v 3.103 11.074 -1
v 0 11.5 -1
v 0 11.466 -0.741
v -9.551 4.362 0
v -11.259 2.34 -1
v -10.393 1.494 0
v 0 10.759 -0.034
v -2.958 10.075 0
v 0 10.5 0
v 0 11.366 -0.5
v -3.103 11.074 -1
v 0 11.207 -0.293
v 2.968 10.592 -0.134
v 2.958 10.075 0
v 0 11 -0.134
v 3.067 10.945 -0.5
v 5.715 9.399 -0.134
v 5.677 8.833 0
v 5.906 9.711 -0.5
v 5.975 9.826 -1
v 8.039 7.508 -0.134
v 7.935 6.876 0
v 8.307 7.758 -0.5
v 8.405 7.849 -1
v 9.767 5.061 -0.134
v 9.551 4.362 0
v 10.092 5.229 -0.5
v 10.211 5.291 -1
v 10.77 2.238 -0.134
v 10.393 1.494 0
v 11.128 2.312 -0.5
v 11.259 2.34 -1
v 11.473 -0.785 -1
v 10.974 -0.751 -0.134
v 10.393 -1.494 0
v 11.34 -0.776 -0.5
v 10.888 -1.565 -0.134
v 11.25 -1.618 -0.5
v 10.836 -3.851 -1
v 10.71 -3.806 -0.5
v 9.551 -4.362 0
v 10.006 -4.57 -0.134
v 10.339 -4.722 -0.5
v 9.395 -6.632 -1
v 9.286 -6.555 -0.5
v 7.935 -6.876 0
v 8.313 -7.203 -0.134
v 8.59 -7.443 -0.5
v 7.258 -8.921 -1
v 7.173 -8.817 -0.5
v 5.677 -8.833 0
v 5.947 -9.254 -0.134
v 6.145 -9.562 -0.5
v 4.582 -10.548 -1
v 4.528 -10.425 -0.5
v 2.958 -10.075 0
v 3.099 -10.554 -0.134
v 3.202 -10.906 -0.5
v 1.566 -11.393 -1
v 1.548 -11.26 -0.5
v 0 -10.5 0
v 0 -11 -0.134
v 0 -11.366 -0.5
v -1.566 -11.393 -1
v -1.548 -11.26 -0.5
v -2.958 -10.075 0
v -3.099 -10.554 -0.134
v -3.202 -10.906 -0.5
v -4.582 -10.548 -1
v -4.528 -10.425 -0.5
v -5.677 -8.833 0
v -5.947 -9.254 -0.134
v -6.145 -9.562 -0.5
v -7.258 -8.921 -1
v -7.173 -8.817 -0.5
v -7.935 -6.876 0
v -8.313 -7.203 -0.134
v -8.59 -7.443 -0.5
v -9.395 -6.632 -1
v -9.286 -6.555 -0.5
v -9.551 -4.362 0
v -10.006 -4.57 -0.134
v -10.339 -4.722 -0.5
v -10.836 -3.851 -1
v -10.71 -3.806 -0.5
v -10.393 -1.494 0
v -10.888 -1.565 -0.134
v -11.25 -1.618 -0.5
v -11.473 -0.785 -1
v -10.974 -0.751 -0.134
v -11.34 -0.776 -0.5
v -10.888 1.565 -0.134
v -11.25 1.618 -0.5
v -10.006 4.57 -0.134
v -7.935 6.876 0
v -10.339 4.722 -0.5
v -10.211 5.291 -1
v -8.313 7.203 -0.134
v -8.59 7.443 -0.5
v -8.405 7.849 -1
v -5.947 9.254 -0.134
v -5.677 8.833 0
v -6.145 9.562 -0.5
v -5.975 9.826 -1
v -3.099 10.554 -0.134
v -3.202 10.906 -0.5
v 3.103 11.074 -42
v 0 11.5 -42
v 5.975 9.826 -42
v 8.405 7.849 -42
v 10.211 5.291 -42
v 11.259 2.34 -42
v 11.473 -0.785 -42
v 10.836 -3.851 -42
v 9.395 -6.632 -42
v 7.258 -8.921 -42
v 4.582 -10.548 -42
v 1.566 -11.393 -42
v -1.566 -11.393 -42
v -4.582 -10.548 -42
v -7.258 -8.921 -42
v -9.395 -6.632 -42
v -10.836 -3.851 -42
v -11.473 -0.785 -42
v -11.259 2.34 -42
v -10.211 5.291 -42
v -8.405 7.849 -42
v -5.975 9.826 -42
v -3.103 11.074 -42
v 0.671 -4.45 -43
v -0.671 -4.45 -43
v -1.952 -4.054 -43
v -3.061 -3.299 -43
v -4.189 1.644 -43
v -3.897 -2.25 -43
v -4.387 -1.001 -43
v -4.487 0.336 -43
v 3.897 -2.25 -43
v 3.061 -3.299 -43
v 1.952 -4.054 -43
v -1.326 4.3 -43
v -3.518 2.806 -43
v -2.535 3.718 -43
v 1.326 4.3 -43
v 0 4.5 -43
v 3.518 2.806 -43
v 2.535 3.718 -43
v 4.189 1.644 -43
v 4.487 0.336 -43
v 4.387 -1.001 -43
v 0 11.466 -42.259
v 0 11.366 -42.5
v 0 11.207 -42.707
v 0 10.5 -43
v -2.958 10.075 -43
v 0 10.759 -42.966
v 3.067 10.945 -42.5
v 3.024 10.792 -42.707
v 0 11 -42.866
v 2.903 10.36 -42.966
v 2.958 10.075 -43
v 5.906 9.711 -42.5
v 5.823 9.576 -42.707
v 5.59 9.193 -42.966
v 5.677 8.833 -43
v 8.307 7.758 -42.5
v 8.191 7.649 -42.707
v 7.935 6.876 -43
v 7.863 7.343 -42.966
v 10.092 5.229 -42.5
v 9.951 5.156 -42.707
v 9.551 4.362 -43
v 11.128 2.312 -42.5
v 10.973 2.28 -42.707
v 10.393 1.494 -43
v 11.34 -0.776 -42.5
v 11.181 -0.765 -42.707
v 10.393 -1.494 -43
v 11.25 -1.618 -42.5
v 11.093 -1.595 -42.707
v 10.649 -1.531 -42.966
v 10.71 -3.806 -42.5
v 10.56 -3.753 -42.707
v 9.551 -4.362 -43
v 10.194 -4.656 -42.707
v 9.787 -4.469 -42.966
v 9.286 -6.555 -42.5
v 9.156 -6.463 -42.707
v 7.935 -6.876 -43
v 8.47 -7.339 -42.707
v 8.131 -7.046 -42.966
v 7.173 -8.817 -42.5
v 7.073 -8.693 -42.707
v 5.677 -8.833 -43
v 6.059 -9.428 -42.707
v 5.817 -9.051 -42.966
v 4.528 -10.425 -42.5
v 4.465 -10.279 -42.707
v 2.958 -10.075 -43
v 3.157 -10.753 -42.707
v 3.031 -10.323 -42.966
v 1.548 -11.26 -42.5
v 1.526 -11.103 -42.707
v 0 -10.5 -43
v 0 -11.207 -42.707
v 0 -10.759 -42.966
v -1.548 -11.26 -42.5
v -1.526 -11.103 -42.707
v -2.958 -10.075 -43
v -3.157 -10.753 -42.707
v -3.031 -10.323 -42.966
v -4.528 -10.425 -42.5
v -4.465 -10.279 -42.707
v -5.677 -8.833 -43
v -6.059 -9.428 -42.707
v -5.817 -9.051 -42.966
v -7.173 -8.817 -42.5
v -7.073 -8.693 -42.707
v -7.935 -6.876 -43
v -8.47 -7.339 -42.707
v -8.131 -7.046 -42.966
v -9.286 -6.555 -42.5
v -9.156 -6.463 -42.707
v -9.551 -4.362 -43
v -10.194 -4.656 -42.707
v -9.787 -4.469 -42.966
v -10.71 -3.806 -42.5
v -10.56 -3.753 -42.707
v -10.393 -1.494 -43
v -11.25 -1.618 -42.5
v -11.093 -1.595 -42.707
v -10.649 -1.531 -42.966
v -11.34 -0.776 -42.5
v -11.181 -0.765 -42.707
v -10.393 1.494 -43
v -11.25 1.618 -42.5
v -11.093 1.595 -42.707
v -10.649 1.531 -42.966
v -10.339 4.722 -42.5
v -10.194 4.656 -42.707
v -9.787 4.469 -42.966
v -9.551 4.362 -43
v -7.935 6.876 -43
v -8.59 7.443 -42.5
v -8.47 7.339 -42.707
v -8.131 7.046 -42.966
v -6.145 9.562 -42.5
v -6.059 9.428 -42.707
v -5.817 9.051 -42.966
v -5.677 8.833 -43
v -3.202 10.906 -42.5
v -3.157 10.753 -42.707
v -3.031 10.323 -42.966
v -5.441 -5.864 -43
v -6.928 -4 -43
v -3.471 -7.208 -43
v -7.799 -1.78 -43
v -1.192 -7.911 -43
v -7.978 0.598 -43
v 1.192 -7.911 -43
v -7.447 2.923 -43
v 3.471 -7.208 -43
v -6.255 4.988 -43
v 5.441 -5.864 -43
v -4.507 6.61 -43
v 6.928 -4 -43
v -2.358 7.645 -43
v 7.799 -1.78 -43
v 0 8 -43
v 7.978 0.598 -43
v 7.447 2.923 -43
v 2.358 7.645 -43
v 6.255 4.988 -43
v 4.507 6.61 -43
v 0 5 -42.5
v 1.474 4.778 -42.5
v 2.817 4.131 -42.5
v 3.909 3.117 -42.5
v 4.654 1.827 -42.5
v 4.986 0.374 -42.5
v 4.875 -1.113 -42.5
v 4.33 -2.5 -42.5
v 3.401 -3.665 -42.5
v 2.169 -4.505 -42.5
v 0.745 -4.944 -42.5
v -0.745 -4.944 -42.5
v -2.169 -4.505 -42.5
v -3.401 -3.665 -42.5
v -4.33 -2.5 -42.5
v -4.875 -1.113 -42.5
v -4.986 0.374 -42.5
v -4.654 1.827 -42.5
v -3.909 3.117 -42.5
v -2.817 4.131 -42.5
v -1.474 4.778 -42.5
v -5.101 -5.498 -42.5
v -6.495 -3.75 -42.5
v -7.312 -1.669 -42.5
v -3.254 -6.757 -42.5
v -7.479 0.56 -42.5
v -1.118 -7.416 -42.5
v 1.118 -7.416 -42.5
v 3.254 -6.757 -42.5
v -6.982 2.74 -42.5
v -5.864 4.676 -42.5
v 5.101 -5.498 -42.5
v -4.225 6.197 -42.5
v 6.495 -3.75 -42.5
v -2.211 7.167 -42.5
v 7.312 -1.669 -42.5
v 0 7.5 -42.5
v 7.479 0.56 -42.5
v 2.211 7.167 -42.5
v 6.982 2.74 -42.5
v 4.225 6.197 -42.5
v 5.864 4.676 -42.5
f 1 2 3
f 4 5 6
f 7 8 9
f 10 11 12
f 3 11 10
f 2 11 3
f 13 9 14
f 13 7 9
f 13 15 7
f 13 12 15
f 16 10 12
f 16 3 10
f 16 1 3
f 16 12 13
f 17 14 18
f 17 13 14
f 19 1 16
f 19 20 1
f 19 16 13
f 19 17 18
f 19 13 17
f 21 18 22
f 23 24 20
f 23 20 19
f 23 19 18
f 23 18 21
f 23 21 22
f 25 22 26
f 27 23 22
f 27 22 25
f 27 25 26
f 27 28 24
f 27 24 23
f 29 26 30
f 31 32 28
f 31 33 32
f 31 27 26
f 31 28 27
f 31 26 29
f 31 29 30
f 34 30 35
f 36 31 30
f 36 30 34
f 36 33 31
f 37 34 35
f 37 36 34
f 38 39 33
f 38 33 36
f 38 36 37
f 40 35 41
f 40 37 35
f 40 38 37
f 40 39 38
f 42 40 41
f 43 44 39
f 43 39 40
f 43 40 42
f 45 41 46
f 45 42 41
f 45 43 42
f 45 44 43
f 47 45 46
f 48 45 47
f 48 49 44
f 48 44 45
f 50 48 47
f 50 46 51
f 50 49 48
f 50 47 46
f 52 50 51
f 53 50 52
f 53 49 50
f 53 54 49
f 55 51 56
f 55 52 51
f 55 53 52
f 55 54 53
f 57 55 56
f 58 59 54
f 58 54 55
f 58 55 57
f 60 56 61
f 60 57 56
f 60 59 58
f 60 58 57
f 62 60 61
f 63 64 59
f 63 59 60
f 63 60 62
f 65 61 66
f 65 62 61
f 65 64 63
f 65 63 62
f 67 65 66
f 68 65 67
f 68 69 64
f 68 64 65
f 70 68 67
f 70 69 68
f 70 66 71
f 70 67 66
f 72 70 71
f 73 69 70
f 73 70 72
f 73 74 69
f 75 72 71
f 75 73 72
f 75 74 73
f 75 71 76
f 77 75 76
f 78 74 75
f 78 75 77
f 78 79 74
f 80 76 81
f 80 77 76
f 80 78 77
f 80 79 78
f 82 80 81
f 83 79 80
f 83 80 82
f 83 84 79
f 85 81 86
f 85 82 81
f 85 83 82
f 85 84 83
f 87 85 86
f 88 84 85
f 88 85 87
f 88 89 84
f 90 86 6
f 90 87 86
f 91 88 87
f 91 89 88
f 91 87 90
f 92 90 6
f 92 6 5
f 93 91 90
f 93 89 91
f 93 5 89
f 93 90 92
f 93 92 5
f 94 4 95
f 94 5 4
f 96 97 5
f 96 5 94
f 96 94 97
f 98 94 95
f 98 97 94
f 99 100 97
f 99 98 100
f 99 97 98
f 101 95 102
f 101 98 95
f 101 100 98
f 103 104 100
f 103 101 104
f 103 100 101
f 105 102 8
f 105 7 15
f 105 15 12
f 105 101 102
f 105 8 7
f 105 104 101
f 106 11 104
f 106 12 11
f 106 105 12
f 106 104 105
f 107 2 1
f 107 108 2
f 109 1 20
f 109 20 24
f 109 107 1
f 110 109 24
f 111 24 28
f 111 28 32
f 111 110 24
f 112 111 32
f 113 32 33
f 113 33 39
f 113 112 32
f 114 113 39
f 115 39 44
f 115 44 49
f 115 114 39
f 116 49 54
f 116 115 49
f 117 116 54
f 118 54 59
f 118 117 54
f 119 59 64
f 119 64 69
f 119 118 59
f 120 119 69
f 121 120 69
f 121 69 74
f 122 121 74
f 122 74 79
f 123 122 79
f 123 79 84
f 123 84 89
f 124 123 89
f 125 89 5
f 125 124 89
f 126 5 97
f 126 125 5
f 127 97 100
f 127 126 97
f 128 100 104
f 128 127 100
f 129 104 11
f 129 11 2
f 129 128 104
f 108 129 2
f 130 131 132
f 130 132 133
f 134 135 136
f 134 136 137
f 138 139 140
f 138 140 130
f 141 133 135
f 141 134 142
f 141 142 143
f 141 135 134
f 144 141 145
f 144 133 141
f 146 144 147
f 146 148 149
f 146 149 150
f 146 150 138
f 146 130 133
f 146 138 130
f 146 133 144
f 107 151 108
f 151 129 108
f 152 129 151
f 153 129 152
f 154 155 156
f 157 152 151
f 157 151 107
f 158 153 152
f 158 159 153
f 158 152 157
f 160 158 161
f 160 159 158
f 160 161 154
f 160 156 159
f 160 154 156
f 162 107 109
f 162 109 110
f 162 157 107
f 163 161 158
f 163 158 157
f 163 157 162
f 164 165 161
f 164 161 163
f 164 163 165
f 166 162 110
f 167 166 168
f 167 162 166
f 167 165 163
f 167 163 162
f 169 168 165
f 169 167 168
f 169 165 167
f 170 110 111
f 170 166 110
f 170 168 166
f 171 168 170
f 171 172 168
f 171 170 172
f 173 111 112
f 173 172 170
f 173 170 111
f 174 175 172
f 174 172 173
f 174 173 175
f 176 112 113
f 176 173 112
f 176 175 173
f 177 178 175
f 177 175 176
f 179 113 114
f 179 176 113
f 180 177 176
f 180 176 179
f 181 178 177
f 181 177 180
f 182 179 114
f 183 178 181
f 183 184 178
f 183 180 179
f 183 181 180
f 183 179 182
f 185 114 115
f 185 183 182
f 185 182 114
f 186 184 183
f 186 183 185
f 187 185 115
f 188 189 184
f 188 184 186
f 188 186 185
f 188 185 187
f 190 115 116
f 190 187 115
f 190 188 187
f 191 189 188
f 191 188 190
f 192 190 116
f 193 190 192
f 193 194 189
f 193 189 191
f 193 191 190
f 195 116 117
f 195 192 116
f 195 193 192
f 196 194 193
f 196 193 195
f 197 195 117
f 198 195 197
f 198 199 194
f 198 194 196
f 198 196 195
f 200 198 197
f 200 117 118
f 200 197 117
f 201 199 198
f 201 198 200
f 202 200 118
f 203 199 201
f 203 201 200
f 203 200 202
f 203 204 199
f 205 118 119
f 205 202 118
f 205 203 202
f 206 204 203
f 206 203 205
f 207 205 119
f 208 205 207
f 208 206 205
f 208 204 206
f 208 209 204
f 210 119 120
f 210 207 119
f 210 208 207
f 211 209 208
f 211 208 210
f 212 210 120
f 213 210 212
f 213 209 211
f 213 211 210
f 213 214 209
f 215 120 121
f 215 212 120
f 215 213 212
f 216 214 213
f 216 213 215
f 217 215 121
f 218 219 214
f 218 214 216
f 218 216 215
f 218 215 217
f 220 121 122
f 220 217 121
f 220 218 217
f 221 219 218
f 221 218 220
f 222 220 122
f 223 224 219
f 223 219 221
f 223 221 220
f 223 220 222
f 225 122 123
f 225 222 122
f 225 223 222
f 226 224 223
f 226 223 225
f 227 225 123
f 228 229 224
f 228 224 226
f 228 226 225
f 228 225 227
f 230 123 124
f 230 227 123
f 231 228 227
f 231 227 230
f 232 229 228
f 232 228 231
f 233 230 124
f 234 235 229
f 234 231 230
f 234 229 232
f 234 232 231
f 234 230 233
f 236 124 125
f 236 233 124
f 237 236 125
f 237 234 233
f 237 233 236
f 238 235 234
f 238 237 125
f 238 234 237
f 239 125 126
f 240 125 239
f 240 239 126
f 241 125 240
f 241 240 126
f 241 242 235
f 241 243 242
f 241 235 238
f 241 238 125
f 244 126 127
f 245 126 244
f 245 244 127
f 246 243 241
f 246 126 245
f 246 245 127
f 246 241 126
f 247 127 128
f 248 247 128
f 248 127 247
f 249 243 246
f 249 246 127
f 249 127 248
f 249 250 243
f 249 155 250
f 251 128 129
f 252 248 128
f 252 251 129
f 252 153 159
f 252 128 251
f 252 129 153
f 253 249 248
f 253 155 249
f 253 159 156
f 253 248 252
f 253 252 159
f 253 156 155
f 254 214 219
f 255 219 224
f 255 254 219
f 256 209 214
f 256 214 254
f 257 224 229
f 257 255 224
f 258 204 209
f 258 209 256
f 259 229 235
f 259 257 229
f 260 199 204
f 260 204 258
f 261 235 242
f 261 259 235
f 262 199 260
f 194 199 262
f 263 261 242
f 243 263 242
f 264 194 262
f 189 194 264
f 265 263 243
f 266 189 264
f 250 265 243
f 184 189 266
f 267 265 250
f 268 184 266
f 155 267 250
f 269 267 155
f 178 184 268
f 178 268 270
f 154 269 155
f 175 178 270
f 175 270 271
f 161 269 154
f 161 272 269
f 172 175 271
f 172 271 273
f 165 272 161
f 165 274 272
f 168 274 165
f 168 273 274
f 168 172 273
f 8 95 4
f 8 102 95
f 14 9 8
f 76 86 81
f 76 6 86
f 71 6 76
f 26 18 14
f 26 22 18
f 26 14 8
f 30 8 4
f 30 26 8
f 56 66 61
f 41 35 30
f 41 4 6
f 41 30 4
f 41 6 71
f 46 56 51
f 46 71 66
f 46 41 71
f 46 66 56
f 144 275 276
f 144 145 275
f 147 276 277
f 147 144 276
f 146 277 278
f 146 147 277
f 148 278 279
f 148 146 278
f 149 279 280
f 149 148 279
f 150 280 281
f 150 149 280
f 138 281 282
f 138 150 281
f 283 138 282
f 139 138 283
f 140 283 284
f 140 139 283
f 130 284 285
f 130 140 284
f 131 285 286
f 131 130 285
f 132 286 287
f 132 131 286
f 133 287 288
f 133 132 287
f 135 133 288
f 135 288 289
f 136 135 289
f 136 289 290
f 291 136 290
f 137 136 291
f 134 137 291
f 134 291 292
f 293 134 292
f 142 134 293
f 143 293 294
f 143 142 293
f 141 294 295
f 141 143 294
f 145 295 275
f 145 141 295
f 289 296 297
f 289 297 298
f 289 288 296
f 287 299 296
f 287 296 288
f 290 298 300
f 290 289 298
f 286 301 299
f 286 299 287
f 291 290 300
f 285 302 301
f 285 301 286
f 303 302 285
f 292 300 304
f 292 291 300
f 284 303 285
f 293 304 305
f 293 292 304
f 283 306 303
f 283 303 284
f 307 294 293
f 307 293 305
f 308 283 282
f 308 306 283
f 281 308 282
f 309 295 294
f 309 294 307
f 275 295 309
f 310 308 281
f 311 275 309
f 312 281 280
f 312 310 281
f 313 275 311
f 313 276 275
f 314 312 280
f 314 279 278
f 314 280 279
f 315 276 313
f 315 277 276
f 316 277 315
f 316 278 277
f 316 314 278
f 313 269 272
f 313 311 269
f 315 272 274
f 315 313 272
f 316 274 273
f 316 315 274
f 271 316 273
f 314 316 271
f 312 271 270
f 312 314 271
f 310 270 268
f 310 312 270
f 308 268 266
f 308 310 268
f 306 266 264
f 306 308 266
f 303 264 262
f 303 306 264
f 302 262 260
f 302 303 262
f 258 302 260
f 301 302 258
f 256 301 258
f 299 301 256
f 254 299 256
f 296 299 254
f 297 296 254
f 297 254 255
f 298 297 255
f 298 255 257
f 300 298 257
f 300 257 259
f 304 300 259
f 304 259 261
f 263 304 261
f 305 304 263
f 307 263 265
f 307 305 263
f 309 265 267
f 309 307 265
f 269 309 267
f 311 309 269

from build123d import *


with BuildPart() as part:
    # Skizze1 → Rotation1 (revolve)
    with BuildSketch(Plane(origin=(0, 0, 0), x_dir=(0, 0, -1), z_dir=(1, 0, 0))):
        with BuildLine():
            Line((0, 0), (0, 10.5))
            ThreePointArc((0, 10.5), (0.292893219, 11.207106781), (1, 11.5))
            Line((1, 11.5), (42, 11.5))
            ThreePointArc((42, 11.5), (42.707106781, 11.207106781), (43, 10.5))
            Line((43, 10.5), (43, 8))
            Line((43, 8), (42.5, 7.5))
            Line((42.5, 7.5), (42.5, 5))
            Line((42.5, 5), (43, 4.5))
            Line((43, 4.5), (43, 0))
            Line((43, 0), (0, 0))
        make_face()
    revolve(axis=Axis((0, 0, 0), (0, 0, -1)))


solid = part.part
